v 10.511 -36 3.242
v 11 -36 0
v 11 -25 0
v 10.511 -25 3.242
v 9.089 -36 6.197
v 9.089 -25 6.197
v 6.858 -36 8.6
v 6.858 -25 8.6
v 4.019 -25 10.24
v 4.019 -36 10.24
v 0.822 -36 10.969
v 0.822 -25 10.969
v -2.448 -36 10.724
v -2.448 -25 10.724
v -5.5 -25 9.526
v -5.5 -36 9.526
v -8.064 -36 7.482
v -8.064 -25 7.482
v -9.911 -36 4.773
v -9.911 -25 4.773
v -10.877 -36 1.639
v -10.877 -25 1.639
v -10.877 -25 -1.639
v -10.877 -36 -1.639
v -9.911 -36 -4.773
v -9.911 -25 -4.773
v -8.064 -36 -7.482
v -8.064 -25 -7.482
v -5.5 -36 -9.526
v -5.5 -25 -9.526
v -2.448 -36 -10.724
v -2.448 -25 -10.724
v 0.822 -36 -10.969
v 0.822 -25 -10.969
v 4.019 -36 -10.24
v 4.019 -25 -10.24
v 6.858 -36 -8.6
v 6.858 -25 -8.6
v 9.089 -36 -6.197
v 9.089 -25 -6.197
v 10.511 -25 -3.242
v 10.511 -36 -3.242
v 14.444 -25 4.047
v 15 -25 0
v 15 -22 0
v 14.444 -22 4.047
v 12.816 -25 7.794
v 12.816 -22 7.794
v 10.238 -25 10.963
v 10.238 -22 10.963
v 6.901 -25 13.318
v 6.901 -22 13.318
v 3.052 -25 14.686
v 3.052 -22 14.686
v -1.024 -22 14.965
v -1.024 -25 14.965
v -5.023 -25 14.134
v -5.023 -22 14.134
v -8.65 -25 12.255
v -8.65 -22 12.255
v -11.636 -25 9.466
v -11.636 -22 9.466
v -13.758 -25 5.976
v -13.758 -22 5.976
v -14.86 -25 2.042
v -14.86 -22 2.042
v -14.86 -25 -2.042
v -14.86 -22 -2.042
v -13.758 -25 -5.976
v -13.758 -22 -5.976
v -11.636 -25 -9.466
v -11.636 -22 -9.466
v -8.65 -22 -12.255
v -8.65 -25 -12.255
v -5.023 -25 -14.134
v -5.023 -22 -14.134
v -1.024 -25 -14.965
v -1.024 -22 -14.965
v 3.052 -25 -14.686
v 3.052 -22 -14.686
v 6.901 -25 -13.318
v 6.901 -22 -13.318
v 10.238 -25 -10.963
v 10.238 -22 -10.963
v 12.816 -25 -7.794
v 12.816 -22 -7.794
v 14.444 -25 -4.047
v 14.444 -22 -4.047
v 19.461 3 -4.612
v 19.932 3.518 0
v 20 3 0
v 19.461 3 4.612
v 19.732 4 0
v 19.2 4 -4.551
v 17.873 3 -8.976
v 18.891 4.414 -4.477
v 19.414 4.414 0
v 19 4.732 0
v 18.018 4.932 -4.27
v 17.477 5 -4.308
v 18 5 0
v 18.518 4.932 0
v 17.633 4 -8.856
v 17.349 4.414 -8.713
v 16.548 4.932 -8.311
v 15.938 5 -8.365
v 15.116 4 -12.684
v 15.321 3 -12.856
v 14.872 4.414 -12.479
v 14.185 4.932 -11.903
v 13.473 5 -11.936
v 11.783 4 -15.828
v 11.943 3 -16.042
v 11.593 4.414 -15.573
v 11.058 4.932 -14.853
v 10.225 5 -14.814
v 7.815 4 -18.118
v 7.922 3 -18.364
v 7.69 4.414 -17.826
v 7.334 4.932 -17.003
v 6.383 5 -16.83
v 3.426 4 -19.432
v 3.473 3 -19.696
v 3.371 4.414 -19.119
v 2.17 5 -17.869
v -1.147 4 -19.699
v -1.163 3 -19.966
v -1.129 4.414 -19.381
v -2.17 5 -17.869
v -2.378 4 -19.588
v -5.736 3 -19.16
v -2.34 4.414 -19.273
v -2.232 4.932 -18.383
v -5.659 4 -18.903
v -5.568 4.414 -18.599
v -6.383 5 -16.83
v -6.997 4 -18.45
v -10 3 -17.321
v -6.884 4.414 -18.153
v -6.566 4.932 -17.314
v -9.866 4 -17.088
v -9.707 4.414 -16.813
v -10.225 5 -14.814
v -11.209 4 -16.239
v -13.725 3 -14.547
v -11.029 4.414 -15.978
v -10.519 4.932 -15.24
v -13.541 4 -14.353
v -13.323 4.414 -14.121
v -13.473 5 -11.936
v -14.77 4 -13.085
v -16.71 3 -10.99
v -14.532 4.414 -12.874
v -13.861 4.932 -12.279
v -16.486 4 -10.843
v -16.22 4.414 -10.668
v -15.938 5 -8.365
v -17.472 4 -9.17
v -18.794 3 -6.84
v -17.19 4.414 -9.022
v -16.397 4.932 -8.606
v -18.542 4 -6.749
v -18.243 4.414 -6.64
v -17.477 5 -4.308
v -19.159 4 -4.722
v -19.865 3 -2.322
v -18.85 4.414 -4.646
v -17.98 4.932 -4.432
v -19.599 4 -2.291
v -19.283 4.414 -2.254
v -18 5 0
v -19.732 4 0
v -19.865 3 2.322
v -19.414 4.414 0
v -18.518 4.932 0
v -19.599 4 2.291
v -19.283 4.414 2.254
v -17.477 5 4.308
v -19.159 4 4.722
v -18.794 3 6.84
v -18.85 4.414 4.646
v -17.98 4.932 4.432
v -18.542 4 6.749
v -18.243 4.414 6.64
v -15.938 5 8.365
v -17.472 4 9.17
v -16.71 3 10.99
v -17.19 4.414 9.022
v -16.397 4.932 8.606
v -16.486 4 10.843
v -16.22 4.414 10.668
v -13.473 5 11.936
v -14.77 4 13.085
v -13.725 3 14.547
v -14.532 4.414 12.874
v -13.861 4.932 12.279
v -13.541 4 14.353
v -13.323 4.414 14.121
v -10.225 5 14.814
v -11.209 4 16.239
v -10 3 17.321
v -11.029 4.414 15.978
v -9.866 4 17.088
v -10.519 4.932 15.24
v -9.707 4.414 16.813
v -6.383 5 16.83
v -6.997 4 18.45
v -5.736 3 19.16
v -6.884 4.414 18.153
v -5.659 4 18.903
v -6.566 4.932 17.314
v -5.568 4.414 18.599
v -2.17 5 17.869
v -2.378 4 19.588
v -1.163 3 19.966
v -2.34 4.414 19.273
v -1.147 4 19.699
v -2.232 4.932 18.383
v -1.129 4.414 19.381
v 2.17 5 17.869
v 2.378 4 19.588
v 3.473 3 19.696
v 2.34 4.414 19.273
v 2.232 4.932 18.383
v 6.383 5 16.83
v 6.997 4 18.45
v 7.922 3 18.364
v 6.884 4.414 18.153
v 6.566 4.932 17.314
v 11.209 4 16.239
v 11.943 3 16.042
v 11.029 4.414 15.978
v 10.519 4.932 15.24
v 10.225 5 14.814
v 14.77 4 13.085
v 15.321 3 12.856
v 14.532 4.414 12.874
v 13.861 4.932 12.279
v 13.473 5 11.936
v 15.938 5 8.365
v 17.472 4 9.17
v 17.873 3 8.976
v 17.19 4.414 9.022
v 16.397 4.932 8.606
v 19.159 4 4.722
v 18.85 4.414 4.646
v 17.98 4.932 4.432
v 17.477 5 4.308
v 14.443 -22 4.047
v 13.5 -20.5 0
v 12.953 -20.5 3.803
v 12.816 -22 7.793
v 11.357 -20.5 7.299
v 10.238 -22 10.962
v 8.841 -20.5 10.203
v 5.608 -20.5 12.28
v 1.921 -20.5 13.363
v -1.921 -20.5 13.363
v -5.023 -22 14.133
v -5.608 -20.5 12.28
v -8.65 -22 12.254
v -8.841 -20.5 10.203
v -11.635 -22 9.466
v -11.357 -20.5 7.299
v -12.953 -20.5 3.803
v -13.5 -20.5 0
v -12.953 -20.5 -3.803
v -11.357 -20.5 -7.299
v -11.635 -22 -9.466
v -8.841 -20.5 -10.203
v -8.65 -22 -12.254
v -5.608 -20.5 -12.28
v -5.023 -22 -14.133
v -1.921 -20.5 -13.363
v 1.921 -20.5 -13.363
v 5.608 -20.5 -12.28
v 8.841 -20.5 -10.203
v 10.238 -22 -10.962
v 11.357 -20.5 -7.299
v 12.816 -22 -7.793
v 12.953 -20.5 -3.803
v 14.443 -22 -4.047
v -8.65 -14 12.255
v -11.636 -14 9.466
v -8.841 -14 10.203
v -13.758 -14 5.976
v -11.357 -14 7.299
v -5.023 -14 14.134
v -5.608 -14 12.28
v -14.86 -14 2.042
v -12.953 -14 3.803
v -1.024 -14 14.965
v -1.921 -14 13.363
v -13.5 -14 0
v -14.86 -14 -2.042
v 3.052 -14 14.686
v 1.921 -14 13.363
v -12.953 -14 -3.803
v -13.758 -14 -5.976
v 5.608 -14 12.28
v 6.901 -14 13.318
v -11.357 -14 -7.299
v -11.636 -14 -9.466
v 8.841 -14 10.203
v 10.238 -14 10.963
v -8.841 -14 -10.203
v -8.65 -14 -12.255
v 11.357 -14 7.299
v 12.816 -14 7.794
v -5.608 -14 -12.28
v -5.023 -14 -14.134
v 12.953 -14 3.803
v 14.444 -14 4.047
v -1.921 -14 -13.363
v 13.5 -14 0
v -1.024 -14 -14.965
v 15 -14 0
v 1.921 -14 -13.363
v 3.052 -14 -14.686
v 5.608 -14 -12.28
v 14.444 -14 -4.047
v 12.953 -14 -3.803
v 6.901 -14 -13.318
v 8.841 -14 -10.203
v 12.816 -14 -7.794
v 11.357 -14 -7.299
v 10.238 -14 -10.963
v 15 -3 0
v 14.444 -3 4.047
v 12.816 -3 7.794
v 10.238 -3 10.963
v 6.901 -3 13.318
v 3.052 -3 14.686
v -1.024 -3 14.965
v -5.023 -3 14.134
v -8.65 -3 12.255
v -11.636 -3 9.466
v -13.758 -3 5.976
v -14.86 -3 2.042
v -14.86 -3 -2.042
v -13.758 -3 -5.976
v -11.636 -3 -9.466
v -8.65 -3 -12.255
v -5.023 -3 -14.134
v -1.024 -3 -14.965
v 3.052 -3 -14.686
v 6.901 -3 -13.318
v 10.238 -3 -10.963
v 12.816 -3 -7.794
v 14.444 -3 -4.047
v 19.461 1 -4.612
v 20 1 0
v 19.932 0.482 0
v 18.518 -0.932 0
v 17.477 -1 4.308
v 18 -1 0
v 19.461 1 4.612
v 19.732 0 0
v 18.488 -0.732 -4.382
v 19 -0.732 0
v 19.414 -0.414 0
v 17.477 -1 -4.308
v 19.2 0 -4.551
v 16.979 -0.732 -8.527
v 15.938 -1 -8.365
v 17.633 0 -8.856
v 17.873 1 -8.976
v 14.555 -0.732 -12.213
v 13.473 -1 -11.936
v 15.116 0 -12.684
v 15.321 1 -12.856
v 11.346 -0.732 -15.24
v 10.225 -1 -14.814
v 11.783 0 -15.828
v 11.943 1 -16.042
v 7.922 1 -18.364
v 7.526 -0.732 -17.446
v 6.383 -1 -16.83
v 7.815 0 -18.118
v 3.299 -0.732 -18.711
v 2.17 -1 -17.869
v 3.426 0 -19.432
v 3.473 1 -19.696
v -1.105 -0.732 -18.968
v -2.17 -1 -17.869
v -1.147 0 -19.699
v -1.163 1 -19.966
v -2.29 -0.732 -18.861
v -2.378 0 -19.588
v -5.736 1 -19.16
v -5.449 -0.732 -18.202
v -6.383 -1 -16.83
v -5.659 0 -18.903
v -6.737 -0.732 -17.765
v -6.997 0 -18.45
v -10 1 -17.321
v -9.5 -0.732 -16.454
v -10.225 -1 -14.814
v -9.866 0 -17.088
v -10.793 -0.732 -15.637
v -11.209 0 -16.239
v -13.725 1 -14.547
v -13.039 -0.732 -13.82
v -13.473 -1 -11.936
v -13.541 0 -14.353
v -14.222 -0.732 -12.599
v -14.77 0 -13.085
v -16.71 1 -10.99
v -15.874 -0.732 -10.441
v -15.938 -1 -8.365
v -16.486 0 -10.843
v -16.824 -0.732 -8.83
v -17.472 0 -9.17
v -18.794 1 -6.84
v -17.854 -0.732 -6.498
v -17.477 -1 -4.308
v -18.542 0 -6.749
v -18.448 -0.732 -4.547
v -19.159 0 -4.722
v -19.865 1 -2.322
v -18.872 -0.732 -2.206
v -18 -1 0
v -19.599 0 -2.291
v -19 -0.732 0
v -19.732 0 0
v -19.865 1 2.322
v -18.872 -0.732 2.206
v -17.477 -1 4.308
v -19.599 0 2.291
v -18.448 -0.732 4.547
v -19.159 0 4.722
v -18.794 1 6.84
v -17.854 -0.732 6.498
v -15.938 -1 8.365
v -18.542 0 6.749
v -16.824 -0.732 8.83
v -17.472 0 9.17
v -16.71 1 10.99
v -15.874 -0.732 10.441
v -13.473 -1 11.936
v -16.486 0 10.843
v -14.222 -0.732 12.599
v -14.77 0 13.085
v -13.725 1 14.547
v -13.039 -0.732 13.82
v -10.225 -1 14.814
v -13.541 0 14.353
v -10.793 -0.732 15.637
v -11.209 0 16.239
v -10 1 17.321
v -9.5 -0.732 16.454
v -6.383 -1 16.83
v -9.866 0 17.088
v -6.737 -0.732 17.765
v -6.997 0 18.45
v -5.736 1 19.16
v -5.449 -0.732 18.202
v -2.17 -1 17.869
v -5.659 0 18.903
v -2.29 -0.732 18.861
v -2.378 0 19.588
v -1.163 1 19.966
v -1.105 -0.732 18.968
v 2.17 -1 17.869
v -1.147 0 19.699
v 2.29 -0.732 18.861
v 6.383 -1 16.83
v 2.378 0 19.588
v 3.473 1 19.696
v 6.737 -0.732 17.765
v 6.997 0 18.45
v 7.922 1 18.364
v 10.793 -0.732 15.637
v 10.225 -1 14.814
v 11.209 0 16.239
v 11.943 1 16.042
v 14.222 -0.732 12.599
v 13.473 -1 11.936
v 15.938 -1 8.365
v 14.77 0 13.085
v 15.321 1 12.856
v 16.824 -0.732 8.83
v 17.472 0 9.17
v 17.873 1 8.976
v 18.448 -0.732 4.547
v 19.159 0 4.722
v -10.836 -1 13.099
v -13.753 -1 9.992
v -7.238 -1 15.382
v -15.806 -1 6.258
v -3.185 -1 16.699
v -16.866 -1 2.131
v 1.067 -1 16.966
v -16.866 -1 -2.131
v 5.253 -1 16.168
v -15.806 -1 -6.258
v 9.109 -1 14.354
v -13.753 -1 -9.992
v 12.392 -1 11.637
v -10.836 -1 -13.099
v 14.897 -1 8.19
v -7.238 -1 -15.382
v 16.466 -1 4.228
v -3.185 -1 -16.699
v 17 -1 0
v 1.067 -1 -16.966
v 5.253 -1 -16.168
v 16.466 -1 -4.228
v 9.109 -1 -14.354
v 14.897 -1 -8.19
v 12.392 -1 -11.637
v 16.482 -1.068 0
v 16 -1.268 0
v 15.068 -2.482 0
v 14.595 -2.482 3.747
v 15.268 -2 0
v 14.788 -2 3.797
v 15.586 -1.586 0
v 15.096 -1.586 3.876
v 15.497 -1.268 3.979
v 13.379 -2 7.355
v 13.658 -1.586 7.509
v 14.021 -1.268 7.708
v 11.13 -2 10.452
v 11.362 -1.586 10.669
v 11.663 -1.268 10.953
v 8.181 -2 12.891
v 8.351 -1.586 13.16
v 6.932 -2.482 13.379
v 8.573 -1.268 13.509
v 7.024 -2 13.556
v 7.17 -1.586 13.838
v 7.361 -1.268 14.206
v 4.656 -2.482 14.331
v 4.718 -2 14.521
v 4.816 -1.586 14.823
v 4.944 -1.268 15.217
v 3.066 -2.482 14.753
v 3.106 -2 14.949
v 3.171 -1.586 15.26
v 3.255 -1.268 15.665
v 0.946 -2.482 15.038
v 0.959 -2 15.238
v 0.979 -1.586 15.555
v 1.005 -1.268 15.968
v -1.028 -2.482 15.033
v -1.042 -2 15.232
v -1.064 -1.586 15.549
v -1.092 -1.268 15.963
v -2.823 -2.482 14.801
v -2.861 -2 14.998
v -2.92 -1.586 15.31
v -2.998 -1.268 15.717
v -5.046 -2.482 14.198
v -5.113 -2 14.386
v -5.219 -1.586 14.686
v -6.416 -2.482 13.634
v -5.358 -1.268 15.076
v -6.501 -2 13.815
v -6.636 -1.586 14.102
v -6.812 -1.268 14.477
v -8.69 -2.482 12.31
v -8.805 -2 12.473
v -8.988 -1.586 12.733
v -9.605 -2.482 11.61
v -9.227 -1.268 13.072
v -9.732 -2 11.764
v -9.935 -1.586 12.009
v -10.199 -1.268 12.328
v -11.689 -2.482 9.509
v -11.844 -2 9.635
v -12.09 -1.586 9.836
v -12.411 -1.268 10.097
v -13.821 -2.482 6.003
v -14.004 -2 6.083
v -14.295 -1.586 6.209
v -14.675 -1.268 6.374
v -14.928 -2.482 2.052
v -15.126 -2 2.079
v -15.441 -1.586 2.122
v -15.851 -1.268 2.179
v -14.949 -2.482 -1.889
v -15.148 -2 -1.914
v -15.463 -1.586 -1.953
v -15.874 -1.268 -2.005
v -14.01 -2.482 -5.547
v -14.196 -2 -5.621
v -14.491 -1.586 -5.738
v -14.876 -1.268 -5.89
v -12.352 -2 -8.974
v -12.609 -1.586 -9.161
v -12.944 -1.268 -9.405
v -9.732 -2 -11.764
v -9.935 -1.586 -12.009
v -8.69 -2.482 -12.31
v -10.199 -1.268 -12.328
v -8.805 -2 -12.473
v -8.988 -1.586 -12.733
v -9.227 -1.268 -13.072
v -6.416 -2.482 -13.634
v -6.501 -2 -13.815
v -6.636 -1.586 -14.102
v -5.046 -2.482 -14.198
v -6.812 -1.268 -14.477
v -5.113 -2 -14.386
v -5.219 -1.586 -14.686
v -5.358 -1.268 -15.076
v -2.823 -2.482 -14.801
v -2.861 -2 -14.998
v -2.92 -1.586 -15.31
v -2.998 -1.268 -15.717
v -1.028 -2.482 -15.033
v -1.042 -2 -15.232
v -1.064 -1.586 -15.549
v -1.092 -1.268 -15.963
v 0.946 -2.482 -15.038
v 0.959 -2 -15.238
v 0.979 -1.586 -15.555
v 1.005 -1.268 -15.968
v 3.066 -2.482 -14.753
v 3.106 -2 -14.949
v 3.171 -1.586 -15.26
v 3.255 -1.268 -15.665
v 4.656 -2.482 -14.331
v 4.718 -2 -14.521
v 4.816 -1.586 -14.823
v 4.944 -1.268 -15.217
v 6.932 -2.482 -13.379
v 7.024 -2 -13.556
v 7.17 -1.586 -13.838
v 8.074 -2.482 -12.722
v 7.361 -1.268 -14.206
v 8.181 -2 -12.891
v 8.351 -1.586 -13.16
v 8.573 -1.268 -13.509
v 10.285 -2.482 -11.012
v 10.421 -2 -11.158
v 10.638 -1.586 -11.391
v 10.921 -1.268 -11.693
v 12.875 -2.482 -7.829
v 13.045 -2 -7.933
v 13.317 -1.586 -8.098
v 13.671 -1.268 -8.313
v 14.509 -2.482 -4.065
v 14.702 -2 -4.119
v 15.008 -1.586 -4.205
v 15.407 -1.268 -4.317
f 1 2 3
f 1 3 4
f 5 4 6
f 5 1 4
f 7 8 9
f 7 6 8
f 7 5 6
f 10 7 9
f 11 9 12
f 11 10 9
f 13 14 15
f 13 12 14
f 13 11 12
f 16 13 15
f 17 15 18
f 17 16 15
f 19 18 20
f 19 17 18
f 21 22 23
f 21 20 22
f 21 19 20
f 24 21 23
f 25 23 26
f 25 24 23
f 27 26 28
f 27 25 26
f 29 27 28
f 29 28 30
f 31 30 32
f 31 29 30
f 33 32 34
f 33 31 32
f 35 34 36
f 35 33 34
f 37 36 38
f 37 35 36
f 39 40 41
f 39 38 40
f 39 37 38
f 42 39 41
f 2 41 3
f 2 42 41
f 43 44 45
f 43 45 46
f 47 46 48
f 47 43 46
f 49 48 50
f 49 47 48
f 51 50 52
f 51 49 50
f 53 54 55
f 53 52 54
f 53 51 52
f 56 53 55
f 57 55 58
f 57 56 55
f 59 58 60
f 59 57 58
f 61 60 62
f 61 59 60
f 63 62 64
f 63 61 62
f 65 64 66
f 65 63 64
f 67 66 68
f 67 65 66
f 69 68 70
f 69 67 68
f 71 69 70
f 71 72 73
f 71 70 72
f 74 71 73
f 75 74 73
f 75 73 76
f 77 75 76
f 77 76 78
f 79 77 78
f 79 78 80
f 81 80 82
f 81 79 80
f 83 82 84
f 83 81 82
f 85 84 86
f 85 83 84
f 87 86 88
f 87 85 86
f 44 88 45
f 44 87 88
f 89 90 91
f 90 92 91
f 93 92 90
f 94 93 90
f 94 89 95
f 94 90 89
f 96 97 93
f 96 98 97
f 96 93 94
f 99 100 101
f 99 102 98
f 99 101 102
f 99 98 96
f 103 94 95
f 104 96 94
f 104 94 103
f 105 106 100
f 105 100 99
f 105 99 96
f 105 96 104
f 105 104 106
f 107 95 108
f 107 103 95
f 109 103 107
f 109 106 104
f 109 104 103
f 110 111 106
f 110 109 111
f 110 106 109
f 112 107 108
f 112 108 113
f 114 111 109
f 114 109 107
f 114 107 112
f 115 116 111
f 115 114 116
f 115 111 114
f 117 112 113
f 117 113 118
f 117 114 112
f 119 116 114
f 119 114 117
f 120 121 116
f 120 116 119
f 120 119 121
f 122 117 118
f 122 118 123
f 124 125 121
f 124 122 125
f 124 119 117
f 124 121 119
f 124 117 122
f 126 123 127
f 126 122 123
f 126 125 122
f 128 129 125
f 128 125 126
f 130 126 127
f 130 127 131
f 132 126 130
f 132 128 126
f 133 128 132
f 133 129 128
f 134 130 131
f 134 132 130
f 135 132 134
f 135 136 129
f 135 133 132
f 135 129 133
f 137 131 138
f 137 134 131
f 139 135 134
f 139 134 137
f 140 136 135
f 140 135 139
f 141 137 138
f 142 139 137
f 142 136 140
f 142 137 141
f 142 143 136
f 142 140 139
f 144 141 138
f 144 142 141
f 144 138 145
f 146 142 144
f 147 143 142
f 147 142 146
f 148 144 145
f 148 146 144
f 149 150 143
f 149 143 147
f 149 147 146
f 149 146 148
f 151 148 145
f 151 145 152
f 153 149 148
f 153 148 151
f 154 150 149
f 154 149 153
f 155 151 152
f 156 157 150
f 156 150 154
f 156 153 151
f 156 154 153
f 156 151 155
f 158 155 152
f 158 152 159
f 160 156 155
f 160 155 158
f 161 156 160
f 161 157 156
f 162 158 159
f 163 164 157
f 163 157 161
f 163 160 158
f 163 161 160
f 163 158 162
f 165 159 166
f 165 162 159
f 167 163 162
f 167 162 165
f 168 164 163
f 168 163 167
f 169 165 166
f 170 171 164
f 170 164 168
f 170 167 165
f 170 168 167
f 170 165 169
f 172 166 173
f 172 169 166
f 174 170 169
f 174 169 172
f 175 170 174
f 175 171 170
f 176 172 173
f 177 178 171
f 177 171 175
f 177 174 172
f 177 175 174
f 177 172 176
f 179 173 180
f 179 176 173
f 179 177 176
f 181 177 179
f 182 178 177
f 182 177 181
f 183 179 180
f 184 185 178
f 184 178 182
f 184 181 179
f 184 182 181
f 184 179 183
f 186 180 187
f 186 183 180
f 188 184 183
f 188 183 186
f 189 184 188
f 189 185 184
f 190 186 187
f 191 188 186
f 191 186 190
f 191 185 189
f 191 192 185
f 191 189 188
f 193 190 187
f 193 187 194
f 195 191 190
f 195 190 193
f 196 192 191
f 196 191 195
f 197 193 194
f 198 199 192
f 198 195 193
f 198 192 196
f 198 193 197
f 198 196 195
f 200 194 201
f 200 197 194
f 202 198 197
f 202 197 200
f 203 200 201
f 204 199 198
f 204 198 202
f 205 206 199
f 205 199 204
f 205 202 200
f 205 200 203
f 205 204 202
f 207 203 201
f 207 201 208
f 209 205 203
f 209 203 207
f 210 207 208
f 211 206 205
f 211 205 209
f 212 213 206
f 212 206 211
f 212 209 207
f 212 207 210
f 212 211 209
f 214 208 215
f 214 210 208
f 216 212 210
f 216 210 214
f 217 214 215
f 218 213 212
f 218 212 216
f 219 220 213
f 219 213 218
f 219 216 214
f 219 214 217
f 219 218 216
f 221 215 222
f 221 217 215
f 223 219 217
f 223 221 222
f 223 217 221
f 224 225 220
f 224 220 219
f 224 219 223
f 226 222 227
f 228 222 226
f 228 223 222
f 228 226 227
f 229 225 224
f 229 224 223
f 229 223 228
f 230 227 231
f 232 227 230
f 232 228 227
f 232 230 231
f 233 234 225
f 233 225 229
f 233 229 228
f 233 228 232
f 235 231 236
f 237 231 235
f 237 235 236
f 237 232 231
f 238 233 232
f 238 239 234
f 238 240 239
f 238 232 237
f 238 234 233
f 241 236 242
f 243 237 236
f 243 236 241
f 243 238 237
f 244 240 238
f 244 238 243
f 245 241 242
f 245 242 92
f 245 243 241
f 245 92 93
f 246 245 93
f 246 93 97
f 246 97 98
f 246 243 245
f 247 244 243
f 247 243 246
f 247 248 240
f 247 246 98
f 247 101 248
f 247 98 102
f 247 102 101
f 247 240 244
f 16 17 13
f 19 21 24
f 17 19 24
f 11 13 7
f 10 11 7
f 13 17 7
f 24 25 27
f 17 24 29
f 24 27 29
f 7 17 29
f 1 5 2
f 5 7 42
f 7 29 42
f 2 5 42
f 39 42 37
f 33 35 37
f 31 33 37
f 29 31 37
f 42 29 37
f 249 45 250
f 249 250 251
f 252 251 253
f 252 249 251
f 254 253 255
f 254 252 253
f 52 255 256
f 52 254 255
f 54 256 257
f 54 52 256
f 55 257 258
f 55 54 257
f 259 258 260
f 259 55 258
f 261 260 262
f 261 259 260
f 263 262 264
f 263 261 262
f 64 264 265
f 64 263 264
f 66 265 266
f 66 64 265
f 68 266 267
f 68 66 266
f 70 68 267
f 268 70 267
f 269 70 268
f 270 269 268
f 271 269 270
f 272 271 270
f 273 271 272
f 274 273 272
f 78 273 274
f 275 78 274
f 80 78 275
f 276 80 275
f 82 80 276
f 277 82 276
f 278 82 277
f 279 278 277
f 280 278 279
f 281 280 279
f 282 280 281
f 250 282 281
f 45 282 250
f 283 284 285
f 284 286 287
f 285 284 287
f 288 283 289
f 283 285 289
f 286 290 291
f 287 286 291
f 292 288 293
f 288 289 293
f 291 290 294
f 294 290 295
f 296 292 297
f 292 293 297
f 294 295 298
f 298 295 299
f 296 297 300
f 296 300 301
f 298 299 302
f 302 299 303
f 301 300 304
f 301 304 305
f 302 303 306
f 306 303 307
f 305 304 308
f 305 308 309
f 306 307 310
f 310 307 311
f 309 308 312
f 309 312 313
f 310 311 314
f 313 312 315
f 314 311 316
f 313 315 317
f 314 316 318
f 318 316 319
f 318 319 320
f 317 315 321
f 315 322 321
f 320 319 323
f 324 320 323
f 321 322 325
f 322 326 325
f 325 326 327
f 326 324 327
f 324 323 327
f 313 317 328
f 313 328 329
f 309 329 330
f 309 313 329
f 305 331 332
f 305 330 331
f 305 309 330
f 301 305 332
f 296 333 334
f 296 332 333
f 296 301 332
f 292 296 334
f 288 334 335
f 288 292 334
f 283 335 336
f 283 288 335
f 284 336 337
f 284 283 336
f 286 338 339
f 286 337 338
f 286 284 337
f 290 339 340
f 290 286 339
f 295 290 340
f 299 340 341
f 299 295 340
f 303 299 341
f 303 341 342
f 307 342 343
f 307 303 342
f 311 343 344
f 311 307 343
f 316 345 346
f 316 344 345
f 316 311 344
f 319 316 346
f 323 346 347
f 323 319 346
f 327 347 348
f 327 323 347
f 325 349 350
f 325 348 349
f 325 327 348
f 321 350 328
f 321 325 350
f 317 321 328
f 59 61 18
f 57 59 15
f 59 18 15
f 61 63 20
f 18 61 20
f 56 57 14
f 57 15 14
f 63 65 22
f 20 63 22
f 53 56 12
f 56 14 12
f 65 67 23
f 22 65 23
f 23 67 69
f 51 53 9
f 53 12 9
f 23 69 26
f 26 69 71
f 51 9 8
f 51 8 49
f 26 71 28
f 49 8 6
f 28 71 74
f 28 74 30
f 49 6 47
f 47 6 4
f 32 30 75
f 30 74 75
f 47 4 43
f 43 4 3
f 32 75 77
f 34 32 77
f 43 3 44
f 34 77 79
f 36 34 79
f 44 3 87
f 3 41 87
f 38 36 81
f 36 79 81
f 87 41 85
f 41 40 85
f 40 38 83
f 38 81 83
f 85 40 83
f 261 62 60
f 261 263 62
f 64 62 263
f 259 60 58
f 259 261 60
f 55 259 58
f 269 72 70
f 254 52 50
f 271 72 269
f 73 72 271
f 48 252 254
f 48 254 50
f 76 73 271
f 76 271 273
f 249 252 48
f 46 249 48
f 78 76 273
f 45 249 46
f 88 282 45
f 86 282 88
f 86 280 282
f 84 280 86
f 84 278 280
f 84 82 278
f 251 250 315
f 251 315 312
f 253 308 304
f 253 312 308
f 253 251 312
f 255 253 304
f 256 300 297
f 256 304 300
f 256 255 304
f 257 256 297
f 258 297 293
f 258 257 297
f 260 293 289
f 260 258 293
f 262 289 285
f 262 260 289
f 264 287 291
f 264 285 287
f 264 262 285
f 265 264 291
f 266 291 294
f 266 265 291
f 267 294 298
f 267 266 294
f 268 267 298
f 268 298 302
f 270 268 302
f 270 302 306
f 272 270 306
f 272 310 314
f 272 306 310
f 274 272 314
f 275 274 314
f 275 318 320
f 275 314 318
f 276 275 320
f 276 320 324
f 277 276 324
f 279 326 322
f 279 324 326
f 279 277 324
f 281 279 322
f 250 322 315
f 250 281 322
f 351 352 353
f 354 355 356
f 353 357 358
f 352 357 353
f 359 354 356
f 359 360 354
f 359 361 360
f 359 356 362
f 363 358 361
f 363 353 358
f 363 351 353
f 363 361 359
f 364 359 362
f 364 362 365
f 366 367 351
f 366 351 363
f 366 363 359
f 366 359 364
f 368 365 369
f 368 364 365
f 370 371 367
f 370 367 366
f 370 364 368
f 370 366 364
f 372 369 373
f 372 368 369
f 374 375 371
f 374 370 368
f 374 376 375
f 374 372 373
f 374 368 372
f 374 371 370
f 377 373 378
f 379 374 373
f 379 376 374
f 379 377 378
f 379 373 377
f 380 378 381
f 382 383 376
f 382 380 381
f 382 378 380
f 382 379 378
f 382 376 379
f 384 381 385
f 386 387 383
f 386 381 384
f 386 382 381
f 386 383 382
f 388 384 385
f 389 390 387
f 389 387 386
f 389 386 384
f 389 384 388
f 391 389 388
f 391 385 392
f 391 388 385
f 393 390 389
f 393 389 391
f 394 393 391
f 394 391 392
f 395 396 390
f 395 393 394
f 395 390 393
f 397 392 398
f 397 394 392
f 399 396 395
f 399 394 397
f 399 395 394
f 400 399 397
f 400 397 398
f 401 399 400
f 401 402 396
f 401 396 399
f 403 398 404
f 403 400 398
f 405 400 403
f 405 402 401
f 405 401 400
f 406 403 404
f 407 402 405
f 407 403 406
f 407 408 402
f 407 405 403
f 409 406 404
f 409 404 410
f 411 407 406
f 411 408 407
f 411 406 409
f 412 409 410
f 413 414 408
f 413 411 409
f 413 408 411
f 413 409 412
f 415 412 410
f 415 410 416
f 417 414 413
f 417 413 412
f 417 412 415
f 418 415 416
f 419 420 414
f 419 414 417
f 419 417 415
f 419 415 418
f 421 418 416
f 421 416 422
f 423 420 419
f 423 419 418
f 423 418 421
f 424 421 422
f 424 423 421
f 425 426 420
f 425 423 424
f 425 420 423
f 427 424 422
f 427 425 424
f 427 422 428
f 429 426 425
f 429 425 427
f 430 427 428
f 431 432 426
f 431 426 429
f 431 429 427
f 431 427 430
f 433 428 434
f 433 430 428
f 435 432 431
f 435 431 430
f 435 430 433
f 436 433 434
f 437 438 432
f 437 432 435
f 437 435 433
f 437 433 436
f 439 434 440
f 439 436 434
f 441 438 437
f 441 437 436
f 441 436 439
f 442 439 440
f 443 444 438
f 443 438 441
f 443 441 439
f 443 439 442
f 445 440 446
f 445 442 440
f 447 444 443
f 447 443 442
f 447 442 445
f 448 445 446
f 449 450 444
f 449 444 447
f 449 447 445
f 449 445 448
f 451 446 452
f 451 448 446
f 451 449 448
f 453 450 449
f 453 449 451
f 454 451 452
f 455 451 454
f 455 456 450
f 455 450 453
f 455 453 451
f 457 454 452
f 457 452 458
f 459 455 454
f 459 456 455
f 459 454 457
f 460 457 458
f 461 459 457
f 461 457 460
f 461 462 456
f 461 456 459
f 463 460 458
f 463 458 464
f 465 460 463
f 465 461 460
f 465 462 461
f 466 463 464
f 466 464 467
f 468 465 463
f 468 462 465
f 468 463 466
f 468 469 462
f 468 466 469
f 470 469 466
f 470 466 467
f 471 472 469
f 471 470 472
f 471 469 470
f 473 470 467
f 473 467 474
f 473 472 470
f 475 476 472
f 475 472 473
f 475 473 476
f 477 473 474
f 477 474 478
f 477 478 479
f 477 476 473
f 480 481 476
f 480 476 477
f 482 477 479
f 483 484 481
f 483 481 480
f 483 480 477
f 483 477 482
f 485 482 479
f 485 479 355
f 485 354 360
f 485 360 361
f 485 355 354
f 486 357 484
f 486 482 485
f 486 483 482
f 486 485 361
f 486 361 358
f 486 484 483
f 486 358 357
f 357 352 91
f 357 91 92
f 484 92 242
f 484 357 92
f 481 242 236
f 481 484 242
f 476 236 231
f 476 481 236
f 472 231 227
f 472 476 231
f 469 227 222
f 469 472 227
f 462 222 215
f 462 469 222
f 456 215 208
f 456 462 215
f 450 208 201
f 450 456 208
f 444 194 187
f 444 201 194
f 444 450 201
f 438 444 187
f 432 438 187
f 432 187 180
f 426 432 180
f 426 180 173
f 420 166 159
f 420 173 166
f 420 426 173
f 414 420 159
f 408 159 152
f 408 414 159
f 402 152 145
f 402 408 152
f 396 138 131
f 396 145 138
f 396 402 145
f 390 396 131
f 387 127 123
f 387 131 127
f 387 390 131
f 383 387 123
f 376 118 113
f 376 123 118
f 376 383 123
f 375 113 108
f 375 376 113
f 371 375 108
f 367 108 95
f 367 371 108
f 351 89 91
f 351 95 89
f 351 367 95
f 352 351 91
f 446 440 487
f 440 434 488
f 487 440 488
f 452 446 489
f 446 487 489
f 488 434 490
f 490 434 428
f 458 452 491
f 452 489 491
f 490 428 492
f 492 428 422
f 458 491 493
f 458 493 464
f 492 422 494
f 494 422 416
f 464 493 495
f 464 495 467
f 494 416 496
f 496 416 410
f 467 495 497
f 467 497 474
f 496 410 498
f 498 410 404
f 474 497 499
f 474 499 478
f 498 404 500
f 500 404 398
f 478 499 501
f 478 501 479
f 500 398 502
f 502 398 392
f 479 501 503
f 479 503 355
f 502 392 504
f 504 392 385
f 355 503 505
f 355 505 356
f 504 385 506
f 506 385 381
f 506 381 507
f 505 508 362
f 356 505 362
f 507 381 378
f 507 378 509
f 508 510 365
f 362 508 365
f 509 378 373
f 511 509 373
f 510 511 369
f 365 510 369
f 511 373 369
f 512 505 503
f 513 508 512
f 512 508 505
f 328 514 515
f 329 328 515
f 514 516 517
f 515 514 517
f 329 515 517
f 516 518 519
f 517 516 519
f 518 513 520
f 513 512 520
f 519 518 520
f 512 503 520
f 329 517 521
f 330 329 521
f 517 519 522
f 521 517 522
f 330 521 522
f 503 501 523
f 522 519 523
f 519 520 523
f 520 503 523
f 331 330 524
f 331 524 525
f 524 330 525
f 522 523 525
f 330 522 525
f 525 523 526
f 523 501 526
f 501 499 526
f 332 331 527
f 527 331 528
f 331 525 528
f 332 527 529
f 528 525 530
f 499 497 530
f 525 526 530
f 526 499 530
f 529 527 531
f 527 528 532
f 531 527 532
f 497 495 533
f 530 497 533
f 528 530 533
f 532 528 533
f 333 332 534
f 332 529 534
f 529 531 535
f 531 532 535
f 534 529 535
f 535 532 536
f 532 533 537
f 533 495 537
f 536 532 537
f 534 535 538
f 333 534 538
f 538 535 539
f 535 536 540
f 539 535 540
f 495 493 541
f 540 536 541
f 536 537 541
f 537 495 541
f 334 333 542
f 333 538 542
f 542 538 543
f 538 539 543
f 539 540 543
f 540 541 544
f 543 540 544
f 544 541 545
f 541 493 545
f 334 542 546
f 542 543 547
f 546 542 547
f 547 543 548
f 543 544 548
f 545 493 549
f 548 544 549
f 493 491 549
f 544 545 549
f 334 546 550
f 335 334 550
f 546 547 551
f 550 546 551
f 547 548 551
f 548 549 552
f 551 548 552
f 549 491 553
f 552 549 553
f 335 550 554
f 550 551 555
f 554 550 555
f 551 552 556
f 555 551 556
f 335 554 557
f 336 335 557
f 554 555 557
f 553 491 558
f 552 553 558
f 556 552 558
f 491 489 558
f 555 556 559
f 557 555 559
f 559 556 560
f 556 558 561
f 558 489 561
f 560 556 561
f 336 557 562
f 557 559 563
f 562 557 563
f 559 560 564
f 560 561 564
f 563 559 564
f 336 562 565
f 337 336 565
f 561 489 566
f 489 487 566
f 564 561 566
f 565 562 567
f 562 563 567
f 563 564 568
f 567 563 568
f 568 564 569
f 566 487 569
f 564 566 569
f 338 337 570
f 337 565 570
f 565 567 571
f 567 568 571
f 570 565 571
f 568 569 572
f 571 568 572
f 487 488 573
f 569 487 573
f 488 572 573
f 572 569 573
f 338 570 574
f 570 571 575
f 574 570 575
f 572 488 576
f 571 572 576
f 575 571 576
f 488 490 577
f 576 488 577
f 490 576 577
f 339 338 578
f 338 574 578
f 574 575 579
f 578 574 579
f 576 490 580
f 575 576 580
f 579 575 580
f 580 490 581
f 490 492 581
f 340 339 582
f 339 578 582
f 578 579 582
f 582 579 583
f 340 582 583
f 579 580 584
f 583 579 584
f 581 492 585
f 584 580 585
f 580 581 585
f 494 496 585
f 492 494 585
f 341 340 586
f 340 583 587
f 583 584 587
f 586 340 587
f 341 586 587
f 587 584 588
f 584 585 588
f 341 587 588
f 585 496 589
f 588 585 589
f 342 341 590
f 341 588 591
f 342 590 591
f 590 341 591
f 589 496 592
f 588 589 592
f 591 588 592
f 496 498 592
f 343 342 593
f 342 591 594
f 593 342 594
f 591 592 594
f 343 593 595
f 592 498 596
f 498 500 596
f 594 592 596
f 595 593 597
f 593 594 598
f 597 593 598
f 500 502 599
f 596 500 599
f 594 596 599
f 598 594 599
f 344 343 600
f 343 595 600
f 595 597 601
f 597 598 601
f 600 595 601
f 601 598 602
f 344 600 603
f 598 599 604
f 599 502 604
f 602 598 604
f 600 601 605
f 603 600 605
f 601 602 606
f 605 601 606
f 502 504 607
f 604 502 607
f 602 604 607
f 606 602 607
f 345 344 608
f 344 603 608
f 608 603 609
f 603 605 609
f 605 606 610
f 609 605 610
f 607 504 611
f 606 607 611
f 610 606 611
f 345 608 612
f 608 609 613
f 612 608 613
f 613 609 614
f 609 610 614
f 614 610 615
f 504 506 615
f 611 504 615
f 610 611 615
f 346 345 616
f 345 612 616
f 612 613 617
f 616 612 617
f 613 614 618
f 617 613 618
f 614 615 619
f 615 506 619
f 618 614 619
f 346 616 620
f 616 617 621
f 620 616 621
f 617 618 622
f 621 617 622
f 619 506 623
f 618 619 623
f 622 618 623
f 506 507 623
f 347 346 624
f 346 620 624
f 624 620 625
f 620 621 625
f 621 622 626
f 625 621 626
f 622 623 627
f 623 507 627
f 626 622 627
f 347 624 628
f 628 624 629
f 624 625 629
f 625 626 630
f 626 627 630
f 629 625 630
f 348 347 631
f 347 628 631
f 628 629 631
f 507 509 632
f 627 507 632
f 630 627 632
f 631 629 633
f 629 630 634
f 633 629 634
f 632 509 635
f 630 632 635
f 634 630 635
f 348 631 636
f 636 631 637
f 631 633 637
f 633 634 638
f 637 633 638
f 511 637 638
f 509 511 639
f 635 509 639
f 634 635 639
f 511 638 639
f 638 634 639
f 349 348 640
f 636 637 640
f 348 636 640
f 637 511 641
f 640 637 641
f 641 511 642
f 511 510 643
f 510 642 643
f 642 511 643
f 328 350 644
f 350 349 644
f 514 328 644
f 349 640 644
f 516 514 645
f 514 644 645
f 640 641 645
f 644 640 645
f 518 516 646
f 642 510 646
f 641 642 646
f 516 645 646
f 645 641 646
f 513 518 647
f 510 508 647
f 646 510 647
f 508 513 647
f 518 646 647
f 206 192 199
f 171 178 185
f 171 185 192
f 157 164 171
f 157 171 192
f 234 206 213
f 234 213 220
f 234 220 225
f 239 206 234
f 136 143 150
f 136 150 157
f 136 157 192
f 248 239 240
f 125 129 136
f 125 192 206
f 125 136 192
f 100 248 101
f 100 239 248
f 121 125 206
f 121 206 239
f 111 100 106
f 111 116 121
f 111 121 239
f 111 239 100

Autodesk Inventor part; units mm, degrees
ref_plane "YZ Plane" through (0, 0, 0) normal (1, 0, 0) x (0, 1, 0)
ref_plane "XZ Plane" through (0, 0, 0) normal (0, 1, 0) x (-1, 0, 0)
ref_plane "XY Plane" through (0, 0, 0) normal (0, 0, 1) x (1, 0, 0)
sketch "Szkic1" plane through (0, 0, 0) normal (0, 0, 1) x (1, 0, 0)
  line L0 (0, 5) -> (20, 5)
  line L1 (20, 5) -> (20, -1)
  line L2 (20, -1) -> (15, -1)
  line L3 (15, -1) -> (15, -14)
  line L4 (15, -14) -> (13.5, -14)
  line L5 (13.5, -14) -> (13.5, -22)
  line L6 (13.5, -22) -> (15, -22)
  line L7 (15, -22) -> (15, -25)
  line L8 (15, -25) -> (11, -25)
  line L9 (11, -25) -> (11, -36)
  line L10 (11, -36) -> (0, -36)
  line L11 (0, -36) -> (0, 5)
  line L12 (0, -44.2) -> (0, 13.2) projected
  point P0 (0, 0)
  dimension "d0" = 20
  dimension "d1" = 6
  dimension "d2" = 5
  dimension "d3" = 13
  dimension "d4" = 1.5
  dimension "d5" = 8
  dimension "d6" = 3
  dimension "d7" = 1.5
  dimension "d8" = 4
  dimension "d9" = 11
revolve "Obrót1" add sketch "Szkic1" angle 360 about axis through (0, -10, 0) along (0, 1, 0)
chamfer "Faza1" distance 1.5 angle 45 1 edges at (-13.5, -22, 0)
fillet "Zaokrąglenie1" radius 2 3 edges at (-20, 5, 0) (-20, -1, 0) (-15, -1, 0)
properties part number "COTS_GENERIC_22mm_Safety_Switch"
